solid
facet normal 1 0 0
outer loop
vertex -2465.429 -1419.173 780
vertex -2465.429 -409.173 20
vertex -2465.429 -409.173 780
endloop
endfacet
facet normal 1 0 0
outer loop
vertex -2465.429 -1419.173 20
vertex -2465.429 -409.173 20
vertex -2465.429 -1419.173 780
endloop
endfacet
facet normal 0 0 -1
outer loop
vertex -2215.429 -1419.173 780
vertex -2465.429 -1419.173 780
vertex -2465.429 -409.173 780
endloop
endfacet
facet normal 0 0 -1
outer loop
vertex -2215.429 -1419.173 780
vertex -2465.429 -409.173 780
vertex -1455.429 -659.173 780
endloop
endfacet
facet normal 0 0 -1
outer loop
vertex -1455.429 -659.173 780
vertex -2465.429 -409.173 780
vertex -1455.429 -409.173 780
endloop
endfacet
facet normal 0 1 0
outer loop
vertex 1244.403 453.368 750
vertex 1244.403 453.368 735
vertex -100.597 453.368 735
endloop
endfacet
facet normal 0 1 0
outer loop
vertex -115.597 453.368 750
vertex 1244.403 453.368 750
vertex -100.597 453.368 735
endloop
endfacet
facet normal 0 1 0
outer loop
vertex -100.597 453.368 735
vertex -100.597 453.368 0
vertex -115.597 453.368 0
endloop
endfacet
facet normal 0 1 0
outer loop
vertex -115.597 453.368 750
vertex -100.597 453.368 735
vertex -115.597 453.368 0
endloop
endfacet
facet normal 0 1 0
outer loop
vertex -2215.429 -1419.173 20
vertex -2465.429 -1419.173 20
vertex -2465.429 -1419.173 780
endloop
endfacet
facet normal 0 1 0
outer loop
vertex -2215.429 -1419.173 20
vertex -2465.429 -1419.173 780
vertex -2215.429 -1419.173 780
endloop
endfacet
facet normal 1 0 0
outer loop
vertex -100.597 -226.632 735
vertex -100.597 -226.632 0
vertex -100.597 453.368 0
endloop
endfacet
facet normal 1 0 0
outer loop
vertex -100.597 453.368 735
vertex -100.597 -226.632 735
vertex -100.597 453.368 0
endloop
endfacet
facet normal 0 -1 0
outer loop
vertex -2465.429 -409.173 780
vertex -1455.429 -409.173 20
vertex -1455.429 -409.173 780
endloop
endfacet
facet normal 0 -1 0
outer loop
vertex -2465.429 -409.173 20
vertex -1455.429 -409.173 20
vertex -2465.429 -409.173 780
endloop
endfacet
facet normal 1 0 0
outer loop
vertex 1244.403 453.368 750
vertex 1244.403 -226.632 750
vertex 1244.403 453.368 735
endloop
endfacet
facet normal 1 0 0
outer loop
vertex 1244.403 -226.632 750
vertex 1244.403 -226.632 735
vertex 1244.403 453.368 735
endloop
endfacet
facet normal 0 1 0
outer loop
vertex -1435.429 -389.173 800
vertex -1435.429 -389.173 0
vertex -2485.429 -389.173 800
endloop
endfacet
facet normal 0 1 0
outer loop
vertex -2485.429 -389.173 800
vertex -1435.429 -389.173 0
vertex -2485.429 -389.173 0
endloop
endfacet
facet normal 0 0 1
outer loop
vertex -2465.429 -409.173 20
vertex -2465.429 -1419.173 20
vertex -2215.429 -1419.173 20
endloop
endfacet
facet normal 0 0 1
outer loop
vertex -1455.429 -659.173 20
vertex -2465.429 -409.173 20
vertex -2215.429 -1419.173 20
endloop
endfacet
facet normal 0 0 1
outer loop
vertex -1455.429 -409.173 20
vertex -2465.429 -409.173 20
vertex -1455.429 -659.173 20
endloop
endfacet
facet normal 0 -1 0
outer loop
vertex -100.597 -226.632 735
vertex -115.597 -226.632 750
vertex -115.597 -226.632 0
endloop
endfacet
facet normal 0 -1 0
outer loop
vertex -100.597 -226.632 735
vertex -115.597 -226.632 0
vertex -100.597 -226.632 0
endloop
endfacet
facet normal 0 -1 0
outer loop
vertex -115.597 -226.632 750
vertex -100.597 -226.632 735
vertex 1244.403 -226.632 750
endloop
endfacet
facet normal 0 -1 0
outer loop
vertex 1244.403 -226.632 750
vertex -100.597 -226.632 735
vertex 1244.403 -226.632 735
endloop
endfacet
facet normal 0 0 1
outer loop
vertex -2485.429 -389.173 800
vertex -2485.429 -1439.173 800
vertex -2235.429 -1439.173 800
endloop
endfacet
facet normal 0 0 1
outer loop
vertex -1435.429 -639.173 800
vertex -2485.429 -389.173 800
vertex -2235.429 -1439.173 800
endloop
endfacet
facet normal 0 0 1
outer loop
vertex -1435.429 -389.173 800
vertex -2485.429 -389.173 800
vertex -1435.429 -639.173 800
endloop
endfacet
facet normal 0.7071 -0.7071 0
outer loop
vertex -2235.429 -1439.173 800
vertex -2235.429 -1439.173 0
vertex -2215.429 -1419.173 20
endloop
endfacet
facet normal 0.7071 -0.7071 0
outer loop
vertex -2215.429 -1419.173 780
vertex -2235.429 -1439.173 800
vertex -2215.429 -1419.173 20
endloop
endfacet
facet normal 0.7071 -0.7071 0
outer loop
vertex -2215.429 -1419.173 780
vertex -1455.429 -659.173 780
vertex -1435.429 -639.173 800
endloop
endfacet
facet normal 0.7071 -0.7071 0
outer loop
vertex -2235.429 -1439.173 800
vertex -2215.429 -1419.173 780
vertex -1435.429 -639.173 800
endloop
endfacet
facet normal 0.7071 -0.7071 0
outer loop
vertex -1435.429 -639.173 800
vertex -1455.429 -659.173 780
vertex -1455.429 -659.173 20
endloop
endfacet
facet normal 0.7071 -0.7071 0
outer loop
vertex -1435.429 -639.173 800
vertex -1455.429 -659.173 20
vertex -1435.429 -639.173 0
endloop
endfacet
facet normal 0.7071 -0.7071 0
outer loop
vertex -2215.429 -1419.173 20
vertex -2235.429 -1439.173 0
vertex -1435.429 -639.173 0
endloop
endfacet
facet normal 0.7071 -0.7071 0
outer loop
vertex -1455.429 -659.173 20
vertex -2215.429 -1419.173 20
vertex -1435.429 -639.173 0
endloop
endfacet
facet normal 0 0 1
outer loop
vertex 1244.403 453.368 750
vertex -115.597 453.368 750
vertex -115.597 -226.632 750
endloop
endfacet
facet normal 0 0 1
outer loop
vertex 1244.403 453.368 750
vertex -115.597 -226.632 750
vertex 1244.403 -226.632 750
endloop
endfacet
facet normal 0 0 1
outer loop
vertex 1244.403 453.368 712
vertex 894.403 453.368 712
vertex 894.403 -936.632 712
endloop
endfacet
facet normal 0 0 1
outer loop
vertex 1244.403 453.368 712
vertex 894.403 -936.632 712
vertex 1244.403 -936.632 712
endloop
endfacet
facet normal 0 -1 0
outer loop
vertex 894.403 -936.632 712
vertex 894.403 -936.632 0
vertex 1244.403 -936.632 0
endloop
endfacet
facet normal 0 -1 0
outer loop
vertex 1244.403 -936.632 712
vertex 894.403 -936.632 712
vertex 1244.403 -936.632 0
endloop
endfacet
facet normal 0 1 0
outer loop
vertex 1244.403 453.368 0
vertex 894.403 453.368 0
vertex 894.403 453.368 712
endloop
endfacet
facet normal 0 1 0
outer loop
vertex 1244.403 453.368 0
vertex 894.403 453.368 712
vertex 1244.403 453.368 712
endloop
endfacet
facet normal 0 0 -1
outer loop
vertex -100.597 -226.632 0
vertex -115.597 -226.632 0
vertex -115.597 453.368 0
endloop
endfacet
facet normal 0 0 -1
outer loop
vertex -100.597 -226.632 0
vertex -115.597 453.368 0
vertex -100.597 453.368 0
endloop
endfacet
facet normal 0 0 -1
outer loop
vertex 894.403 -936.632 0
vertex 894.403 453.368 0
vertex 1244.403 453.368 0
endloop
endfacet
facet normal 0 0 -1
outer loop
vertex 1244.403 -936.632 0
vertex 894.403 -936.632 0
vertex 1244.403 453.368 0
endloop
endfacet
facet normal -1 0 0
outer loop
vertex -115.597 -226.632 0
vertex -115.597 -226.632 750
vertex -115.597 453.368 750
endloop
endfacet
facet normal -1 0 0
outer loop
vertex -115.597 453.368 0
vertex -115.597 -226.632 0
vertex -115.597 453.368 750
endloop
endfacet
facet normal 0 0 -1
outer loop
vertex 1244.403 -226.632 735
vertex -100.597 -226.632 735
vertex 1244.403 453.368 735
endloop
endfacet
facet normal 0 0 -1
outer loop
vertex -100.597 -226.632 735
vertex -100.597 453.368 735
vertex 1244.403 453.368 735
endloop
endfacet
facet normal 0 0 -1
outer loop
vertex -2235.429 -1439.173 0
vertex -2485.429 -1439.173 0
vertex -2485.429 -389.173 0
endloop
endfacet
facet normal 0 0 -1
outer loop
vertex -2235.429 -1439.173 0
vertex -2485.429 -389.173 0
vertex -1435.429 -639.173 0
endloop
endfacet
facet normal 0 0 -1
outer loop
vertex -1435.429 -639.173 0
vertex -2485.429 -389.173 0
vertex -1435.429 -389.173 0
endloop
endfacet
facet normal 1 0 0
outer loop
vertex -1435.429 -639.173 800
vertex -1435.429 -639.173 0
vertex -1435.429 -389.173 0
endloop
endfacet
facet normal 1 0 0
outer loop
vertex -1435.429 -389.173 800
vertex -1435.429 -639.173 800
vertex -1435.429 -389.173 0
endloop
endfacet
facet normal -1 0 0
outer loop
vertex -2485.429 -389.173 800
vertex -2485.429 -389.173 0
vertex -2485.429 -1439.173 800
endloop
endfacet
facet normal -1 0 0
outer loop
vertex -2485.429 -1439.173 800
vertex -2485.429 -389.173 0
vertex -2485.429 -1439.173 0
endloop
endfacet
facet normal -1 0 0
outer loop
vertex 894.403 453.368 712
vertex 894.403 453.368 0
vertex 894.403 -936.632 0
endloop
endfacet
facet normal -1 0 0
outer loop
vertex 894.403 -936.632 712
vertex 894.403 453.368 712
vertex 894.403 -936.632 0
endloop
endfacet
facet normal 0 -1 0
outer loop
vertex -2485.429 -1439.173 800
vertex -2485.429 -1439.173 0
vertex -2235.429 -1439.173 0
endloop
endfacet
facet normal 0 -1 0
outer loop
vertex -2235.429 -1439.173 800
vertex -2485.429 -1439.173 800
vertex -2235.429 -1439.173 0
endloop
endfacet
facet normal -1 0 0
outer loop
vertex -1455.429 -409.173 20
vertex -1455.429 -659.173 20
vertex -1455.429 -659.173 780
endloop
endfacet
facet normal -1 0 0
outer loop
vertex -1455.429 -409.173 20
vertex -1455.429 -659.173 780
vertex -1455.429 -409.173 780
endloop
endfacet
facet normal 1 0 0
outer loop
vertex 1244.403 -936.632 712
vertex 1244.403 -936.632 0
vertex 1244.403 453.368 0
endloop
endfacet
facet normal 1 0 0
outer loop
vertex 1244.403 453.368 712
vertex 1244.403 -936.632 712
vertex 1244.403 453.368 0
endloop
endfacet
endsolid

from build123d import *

# Parameters (mm, degrees)
F0_W     = 1010
F0_H     = 680
F0_W_2   = 350
F1_DEPTH = 750
F2_T     = -15
F0_H_2   = 710
F3_DEPTH = 712
F5_DEPTH = 800
F6_T     = -20


with BuildPart() as f1:
    # F0 (on Top) → F1 (new body)
    with BuildSketch(Plane.XY):
        with Locations((389.402885437, 113.3681946993)):
            Rectangle(F0_W, F0_H)
        with Locations((1069.402885437, 113.3681946993)):
            Rectangle(F0_W_2, F0_H)
    extrude(amount=F1_DEPTH)

    # F2
    f2_openings = [f1.faces().sort_by_distance(p)[0] for p in [
        (564.402885, -226.631805, 375),
        (1244.402885, 113.368195, 375),
        (564.402885, 453.368195, 375),
        (564.402885, 113.368195, 0),
    ]]
    offset(amount=F2_T, openings=f2_openings)


with BuildPart() as f3:
    # F0 (on Top) → F3 (new body)
    with BuildSketch(Plane.XY):
        with Locations((1069.402885437, 113.3681946993)):
            Rectangle(F0_W_2, F0_H)
        with Locations((1069.402885437, -581.6318053007)):
            Rectangle(F0_W_2, F0_H_2)
    extrude(amount=F3_DEPTH)


with BuildPart() as f5:
    # F4 (on face) → F5 (new body)
    with BuildSketch(Plane.XY):
        Polygon((-1435.4287287383, -389.1728639603), (-2485.4287287383, -389.1728639603), (-2485.4287287383, -1439.1728639603), (-2235.4287287383, -1439.1728639603), (-1435.4287287383, -639.1728639603), align=None)
    extrude(amount=F5_DEPTH)

    # F6
    f6_openings = [f5.faces().sort_by_distance(p)[0] for p in [
        (-1835.428729, -1039.172864, 400),
    ]]
    offset(amount=F6_T, openings=f6_openings)


solid = Compound([f1.part, f3.part, f5.part])
